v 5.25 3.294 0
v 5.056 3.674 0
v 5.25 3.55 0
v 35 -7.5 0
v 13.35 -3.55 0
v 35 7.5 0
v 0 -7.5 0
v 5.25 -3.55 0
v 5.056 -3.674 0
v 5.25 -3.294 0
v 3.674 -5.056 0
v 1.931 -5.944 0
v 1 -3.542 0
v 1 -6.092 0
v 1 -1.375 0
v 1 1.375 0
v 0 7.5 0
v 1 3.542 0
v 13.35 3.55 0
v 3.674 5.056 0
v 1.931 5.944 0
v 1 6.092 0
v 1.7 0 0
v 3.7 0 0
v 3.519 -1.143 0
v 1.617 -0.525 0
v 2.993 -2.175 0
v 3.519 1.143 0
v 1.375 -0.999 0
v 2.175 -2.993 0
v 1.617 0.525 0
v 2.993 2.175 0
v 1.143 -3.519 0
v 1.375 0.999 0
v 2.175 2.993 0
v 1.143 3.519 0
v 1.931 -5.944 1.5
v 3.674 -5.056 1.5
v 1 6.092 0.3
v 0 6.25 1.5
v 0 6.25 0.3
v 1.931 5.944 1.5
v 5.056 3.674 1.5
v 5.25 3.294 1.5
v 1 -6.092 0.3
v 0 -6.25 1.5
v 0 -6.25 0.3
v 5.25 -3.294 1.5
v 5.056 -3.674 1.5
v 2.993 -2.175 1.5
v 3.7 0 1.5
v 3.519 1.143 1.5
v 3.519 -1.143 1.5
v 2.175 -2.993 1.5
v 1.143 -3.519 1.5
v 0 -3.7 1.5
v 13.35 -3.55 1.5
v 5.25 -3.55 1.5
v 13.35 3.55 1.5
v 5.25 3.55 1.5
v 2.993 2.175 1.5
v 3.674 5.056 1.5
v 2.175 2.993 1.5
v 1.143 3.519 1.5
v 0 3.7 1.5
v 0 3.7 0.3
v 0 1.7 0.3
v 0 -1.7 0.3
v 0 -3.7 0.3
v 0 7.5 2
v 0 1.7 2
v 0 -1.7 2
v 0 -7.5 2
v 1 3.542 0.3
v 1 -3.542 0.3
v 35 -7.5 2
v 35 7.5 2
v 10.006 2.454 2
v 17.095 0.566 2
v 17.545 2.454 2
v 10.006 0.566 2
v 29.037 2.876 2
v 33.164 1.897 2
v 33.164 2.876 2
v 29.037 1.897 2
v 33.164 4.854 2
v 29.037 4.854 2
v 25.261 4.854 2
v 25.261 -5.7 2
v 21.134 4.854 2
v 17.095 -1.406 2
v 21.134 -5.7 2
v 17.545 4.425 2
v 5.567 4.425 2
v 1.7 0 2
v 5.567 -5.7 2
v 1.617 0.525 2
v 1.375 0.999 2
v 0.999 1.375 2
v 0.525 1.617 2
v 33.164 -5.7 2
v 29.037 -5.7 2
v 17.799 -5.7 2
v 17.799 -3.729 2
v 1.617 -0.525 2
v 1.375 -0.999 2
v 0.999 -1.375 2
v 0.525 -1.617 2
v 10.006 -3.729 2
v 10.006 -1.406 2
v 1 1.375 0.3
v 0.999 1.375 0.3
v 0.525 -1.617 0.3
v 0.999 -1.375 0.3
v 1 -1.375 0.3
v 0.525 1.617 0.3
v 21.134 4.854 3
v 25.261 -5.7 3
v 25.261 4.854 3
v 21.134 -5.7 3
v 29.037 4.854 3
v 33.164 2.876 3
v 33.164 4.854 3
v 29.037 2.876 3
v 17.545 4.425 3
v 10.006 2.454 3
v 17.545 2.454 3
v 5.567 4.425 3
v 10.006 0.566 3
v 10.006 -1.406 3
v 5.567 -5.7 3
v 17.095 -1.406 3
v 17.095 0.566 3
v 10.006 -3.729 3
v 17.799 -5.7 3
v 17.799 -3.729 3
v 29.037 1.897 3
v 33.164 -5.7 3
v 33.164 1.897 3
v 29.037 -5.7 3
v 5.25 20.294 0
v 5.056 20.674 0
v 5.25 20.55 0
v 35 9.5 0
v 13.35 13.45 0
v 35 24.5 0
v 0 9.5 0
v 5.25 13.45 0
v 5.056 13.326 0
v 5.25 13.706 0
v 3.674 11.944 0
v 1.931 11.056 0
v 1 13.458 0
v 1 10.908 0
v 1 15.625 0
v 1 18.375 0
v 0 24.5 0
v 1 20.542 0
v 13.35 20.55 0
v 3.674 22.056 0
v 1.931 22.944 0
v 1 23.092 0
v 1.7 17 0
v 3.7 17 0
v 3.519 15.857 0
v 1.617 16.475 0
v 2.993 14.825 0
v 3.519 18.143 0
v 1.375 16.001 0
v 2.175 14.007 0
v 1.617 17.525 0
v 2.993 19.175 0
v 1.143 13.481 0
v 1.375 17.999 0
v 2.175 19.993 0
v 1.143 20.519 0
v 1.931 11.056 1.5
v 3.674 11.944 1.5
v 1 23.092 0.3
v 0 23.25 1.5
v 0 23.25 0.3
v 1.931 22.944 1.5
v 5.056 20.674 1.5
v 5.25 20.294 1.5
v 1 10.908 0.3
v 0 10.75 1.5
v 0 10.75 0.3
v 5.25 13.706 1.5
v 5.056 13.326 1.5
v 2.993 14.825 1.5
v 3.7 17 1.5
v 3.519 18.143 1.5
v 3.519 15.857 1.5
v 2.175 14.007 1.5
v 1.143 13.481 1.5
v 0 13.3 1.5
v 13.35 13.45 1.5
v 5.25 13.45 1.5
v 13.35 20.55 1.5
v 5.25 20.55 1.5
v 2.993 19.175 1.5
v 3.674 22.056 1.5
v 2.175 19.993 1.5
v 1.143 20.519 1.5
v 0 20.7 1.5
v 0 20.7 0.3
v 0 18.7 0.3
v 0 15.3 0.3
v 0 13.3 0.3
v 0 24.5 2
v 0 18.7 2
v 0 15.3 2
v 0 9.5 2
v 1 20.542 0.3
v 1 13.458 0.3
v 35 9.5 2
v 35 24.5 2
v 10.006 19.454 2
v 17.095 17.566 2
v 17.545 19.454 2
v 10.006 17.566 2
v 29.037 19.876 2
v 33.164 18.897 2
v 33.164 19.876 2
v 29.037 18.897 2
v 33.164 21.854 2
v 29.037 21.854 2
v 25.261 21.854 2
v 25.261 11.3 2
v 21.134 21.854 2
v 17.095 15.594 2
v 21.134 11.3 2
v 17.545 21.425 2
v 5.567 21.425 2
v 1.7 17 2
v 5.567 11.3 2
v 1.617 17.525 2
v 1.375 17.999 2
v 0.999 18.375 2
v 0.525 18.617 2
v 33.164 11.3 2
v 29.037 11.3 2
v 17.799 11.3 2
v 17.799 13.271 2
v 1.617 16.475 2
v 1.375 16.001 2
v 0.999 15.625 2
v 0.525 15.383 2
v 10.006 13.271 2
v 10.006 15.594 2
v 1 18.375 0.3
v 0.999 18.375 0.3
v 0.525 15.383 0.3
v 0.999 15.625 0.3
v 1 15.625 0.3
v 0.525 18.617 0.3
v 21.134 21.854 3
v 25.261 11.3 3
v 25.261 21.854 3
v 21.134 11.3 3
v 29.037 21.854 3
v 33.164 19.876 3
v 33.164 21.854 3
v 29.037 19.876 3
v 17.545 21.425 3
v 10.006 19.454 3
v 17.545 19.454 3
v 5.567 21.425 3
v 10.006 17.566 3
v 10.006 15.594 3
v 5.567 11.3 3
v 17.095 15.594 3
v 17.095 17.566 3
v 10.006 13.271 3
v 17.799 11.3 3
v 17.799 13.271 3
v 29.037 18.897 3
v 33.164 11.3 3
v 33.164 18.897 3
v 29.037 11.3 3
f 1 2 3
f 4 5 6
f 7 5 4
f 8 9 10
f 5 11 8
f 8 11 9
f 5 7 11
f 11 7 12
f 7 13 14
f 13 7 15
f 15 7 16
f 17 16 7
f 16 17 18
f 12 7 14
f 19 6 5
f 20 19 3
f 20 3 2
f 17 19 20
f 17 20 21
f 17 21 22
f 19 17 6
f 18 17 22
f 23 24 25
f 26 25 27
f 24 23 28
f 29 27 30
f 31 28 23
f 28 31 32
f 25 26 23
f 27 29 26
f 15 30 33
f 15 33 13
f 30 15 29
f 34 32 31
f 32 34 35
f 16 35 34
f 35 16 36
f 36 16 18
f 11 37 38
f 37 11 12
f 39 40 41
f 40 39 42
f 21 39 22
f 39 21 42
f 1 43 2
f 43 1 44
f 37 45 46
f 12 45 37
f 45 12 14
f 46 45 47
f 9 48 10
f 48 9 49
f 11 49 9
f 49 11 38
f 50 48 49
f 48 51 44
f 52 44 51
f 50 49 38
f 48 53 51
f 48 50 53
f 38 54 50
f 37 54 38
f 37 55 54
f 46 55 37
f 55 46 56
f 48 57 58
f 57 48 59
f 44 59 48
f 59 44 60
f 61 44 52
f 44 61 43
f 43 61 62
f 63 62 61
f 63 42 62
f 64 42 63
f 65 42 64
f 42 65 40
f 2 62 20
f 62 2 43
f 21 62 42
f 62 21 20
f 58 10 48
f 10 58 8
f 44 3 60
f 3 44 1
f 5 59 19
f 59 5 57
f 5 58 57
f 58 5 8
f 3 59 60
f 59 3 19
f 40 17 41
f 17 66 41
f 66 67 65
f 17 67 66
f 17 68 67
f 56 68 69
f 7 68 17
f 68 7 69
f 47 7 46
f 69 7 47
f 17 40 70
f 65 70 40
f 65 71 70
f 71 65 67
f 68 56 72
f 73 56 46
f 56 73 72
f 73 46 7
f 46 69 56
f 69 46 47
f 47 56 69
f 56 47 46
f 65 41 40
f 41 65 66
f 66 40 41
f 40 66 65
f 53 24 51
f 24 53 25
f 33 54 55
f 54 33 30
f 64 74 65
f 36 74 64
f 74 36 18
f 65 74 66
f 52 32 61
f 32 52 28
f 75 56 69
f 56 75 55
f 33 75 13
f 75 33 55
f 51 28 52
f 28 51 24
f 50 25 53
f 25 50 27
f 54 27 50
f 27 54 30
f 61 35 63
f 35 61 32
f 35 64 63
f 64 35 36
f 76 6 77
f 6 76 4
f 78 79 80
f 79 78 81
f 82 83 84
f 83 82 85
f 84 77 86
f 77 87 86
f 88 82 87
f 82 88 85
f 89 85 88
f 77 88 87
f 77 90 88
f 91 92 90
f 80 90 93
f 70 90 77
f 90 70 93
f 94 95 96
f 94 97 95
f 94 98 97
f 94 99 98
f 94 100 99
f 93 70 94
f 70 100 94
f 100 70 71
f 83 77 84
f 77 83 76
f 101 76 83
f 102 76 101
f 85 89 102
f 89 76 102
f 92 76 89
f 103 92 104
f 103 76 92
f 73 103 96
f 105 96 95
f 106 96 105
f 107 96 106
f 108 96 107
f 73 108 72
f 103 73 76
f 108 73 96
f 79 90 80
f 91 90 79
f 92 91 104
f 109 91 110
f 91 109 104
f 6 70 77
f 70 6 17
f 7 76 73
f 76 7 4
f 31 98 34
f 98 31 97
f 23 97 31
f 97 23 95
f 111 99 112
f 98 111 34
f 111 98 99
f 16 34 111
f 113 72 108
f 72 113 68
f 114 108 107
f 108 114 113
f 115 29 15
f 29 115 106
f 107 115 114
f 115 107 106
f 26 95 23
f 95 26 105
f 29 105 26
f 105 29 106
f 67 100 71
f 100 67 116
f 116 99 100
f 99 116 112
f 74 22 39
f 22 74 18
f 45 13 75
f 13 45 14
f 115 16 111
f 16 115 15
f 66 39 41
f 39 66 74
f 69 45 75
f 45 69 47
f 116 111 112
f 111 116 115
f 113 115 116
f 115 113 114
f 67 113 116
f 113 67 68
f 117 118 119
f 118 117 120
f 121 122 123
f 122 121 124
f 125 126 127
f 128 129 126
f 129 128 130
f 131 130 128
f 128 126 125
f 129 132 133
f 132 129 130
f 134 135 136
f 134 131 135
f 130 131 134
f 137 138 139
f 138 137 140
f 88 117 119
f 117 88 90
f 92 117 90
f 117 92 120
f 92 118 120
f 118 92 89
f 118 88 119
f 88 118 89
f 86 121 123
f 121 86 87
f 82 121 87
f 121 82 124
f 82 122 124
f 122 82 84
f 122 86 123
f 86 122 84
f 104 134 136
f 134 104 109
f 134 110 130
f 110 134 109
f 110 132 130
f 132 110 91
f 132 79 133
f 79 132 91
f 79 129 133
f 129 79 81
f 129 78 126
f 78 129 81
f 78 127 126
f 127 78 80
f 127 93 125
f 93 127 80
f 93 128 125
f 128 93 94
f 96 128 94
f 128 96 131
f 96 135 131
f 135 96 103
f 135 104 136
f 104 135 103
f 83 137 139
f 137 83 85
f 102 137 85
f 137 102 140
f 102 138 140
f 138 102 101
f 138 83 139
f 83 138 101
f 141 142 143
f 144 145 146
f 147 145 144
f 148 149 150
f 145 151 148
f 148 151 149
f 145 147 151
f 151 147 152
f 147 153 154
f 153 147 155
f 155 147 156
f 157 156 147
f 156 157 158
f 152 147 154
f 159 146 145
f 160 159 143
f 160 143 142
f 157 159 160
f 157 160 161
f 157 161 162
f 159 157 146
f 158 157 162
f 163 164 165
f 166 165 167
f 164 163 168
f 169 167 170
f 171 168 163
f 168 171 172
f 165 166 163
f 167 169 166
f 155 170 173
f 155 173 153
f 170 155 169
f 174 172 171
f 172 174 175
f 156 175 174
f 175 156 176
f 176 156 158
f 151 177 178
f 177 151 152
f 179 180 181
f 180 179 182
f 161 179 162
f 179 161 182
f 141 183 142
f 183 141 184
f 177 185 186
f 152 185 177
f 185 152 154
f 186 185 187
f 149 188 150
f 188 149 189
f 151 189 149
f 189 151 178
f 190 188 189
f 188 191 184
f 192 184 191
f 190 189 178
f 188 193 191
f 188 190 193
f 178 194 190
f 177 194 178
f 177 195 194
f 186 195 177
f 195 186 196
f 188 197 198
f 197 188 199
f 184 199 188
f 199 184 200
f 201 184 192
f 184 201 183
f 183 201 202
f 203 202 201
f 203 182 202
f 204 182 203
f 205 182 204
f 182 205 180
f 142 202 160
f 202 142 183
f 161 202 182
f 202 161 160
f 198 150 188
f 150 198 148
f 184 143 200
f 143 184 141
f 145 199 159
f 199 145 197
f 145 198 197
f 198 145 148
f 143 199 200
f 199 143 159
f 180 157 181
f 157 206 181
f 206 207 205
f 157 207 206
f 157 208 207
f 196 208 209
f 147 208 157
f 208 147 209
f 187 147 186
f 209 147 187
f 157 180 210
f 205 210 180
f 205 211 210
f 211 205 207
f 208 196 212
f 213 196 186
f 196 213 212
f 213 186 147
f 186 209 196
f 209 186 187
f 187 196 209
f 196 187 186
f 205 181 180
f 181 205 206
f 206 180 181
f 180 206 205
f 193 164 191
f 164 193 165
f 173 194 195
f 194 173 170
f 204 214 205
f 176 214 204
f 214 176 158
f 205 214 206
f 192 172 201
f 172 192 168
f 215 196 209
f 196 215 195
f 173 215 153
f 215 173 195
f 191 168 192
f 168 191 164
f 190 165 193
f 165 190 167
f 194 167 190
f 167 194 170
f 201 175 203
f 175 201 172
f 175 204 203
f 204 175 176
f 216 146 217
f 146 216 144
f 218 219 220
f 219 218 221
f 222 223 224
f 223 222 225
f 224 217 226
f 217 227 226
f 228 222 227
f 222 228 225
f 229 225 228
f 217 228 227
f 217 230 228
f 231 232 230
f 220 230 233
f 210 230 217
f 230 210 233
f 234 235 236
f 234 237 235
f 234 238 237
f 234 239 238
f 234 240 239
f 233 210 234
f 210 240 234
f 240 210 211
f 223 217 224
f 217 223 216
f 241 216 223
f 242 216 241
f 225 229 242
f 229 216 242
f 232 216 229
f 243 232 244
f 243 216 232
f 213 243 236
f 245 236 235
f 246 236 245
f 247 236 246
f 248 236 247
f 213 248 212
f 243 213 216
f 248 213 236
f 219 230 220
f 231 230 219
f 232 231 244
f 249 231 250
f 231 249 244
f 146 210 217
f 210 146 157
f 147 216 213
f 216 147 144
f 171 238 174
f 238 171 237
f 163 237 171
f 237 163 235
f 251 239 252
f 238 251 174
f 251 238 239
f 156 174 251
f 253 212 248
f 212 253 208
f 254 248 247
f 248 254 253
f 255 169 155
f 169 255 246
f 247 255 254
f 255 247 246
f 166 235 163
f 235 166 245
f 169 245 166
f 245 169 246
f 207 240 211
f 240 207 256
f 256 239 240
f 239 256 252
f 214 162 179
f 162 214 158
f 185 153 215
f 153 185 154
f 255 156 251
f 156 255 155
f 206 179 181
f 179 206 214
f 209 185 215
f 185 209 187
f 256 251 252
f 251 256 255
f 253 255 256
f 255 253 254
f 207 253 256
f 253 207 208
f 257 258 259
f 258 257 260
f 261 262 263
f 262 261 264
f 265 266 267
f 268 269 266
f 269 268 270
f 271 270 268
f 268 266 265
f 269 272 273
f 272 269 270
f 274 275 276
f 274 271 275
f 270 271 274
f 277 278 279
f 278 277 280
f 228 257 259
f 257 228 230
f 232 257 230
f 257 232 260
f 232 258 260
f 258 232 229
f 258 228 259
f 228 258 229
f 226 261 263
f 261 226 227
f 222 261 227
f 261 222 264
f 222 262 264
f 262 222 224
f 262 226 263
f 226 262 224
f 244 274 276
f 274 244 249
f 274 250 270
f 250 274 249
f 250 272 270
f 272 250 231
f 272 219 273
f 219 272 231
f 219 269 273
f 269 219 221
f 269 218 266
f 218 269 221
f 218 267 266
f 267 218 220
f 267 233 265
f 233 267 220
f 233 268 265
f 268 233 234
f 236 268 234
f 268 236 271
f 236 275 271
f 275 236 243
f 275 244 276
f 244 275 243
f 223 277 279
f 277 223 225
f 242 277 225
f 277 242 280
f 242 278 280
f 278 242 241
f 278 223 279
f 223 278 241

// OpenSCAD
$fn=20;
height=1.5;
in=7.4;
out=12.5;
rw=7.1;
rl=8.1;


module clip(){
rotate([0,0,180])
difference(){
union(){
    cylinder(d=out,h=height);
    translate([-out/2 -rl+1,-rw/2,0])
    cube([rl,rw,height]);
}


translate([out/4,0,height/2])
cube([out/2,out,height],center=true);

cylinder(d=in,h=height);
}

}

module elisa(){
    translate([0,-7,0])
    cube([1,14,.3]);
difference(){
    
    translate([0,-7.5,0])
    cube([35,15,2]);
    translate([0,0,0])
    clip();

    cylinder(d=in-4,h=20);
}
    scale([1.7,1,1])
    translate([2,-5.7,2])
    linear_extrude(height=1)
    text("Eli", font = "Bernadette:style=Bold");

}

elisa();
translate([0,17,0])
elisa();
